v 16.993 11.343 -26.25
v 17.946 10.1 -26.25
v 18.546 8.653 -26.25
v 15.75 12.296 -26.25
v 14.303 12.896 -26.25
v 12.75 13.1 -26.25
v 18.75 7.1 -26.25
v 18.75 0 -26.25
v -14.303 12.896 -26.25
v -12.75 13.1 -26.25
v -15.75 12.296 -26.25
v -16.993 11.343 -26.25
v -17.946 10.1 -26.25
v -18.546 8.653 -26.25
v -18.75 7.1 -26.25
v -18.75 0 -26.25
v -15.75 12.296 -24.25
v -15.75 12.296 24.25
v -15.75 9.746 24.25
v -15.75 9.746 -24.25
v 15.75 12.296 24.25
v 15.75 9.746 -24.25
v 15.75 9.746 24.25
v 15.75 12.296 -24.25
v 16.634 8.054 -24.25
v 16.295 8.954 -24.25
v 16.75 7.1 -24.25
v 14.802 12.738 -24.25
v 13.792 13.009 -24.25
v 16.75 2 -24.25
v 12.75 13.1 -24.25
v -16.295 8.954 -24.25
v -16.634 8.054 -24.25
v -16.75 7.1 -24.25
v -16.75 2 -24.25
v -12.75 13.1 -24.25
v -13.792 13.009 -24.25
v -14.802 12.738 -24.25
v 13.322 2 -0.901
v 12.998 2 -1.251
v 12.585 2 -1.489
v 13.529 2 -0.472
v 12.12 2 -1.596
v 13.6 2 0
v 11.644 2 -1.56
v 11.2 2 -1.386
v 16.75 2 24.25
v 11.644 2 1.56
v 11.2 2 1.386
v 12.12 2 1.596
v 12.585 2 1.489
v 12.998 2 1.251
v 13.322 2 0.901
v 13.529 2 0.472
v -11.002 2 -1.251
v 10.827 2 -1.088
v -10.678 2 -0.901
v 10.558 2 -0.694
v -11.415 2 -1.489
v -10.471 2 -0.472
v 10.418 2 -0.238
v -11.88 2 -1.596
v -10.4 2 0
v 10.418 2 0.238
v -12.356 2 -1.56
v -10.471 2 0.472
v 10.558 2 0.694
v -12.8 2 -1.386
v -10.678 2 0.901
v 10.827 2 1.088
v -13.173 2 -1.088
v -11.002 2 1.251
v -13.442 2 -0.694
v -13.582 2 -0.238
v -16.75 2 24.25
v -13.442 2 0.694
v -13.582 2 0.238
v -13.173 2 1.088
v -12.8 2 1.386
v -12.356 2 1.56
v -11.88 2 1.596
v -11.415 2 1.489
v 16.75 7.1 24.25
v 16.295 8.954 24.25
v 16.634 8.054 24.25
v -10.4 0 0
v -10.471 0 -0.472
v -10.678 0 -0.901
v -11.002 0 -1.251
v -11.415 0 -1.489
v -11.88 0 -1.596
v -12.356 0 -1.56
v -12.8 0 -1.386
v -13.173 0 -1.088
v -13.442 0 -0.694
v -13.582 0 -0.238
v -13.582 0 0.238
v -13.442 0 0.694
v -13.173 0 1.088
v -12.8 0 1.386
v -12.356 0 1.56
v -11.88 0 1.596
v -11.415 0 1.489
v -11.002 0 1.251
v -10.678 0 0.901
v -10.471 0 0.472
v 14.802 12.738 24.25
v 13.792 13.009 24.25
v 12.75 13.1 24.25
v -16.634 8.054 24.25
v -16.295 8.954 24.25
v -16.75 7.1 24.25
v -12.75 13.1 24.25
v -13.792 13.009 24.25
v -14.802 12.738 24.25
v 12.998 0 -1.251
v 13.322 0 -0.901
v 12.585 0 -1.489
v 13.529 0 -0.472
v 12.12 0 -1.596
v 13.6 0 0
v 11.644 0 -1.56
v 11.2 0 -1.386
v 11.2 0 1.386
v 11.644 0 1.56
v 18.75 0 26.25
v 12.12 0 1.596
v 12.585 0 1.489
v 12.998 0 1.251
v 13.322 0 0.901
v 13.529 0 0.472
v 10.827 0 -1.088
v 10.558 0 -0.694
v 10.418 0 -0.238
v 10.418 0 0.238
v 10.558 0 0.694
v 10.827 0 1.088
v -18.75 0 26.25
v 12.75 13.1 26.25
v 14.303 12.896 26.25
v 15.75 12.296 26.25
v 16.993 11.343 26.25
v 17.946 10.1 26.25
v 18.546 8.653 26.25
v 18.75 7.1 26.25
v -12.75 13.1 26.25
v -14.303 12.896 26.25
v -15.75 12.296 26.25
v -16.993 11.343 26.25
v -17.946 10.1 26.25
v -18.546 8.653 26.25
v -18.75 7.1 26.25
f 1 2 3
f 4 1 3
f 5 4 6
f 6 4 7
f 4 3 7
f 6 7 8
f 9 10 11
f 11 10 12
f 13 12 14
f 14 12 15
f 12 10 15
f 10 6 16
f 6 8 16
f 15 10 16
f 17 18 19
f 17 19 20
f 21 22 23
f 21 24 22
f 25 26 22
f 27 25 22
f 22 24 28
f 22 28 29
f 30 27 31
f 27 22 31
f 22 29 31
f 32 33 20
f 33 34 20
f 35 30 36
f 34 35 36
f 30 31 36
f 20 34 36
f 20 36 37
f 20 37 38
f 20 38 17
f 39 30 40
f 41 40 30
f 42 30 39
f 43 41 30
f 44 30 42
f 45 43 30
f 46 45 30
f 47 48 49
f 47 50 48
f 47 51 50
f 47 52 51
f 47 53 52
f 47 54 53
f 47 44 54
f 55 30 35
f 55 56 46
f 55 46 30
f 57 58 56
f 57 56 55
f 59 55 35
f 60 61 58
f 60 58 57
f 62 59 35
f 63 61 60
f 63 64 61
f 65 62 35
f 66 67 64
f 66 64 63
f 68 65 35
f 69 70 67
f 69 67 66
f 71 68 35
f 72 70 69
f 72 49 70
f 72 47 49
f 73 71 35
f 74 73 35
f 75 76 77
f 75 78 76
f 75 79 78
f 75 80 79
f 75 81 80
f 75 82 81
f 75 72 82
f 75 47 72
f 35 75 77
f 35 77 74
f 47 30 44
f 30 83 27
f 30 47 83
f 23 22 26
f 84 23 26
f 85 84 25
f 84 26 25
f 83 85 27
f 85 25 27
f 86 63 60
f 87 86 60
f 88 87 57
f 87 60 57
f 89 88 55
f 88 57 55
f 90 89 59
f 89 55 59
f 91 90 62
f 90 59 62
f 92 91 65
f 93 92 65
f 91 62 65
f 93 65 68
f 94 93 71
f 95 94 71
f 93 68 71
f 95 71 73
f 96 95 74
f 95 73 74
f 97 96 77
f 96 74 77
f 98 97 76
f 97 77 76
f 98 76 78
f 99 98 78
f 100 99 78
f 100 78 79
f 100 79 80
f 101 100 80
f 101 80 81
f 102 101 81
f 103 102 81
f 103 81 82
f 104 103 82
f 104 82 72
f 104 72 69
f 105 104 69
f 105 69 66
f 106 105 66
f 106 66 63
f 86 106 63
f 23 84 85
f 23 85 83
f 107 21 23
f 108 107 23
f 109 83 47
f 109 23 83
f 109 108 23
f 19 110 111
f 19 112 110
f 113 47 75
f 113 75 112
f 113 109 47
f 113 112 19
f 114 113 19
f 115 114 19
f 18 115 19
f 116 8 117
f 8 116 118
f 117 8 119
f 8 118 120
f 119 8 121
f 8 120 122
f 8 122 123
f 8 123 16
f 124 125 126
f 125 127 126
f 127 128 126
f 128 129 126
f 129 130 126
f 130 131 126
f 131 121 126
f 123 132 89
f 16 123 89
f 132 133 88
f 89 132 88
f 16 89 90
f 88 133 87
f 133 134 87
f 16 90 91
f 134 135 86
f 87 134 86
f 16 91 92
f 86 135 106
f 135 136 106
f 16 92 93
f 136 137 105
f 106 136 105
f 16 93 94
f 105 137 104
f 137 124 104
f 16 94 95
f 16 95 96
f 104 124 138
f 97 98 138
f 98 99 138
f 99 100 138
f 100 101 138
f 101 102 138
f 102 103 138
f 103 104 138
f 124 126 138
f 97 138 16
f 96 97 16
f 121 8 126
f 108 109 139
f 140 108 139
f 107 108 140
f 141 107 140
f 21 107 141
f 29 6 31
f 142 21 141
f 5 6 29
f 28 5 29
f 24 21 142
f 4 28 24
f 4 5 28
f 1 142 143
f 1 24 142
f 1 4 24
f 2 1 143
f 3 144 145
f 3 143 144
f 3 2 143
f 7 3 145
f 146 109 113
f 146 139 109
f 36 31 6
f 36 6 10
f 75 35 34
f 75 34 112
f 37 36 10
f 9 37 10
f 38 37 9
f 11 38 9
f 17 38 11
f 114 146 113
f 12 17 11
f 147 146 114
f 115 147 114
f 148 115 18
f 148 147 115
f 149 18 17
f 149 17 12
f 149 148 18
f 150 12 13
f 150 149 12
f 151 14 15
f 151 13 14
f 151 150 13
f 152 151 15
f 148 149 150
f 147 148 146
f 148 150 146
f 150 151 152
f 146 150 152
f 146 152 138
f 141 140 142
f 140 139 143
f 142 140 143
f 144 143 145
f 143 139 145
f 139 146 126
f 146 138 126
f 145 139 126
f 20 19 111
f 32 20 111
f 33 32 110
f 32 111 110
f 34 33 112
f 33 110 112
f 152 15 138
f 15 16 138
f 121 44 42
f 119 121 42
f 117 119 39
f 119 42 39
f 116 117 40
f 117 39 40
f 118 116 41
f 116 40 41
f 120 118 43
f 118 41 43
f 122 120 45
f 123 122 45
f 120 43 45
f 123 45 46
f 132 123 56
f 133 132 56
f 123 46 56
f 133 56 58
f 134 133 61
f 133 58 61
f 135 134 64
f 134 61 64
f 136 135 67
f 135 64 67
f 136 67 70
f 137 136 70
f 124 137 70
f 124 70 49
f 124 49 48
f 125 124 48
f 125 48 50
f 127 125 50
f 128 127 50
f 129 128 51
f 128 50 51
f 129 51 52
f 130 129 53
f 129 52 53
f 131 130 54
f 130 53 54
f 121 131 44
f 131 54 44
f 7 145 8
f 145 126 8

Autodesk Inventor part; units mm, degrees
ref_plane "YZ Plane" through (0, 0, 0) normal (1, 0, 0) x (0, 1, 0)
ref_plane "XZ Plane" through (0, 0, 0) normal (0, 1, 0) x (-1, 0, 0)
ref_plane "XY Plane" through (0, 0, 0) normal (0, 0, 1) x (1, 0, 0)
sketch "スケッチ1" plane through (0, 0, 0) normal (0, 1, 0) x (-1, 0, 0)
  line L0 (-18.75, -26.25) -> (18.75, -26.25)
  line L1 (18.75, -26.25) -> (18.75, 26.25)
  line L2 (18.75, 26.25) -> (-18.75, 26.25)
  line L3 (-18.75, 26.25) -> (-18.75, -26.25)
  line L4 (-18.75, -26.25) -> (18.75, 26.25) construction
  line L5 (18.75, -26.25) -> (-18.75, 26.25) construction
  point P0 (0, 0)
  dimension "d0" = 37.5
  dimension "d1" = 52.5
extrude "押し出し1" add sketch "スケッチ1" along normal blind 13.1
fillet "フィレット1" radius 6 2 edges at (18.75, 13.1, 0) (-18.75, 13.1, 0)
shell "シェル1" thickness 2 removed faces 0
sketch "スケッチ2" plane through (0, 13.1, 0) normal (0, 1, 0) x (1, 0, 0)
  line L0 (16.75, 24.25) -> (-16.75, 24.25) projected
  line L1 (15.75, -24.25) -> (-15.75, -24.25)
  line L2 (-15.75, -24.25) -> (-15.75, 24.25)
  line L3 (-15.75, 24.25) -> (15.75, 24.25)
  line L4 (15.75, 24.25) -> (15.75, -24.25)
  line L5 (15.75, -24.25) -> (-15.75, 24.25) construction
  line L6 (-15.75, -24.25) -> (15.75, 24.25) construction
  line L7 (-12.75, -26.25) -> (-12.75, 26.25) projected
  point P0 (0, 0)
  dimension "d8" = 3
extrude "押し出し2" cut sketch "スケッチ2" against normal blind 5
sketch "スケッチ3" plane through (-16.75, 2, 24.25) normal (0, 1, 0) x (1, 0, 0)
  circle A0 centre (28.75, 24.25) radius 1.6
  circle A1 centre (4.75, 24.25) radius 1.6
  line L0 (4, 48.5) -> (29.5, 48.5) projected
  line L1 (16.75, 48.5) -> (16.75, 0) construction
  line L2 (0, 0) -> (33.5, 0) projected
  point P0 (16.75, 24.25)
  dimension "d9" = 3.2
  dimension "d11" = 24
extrude "押し出し3" cut sketch "スケッチ3" against normal through all
properties part number "battery_box"
